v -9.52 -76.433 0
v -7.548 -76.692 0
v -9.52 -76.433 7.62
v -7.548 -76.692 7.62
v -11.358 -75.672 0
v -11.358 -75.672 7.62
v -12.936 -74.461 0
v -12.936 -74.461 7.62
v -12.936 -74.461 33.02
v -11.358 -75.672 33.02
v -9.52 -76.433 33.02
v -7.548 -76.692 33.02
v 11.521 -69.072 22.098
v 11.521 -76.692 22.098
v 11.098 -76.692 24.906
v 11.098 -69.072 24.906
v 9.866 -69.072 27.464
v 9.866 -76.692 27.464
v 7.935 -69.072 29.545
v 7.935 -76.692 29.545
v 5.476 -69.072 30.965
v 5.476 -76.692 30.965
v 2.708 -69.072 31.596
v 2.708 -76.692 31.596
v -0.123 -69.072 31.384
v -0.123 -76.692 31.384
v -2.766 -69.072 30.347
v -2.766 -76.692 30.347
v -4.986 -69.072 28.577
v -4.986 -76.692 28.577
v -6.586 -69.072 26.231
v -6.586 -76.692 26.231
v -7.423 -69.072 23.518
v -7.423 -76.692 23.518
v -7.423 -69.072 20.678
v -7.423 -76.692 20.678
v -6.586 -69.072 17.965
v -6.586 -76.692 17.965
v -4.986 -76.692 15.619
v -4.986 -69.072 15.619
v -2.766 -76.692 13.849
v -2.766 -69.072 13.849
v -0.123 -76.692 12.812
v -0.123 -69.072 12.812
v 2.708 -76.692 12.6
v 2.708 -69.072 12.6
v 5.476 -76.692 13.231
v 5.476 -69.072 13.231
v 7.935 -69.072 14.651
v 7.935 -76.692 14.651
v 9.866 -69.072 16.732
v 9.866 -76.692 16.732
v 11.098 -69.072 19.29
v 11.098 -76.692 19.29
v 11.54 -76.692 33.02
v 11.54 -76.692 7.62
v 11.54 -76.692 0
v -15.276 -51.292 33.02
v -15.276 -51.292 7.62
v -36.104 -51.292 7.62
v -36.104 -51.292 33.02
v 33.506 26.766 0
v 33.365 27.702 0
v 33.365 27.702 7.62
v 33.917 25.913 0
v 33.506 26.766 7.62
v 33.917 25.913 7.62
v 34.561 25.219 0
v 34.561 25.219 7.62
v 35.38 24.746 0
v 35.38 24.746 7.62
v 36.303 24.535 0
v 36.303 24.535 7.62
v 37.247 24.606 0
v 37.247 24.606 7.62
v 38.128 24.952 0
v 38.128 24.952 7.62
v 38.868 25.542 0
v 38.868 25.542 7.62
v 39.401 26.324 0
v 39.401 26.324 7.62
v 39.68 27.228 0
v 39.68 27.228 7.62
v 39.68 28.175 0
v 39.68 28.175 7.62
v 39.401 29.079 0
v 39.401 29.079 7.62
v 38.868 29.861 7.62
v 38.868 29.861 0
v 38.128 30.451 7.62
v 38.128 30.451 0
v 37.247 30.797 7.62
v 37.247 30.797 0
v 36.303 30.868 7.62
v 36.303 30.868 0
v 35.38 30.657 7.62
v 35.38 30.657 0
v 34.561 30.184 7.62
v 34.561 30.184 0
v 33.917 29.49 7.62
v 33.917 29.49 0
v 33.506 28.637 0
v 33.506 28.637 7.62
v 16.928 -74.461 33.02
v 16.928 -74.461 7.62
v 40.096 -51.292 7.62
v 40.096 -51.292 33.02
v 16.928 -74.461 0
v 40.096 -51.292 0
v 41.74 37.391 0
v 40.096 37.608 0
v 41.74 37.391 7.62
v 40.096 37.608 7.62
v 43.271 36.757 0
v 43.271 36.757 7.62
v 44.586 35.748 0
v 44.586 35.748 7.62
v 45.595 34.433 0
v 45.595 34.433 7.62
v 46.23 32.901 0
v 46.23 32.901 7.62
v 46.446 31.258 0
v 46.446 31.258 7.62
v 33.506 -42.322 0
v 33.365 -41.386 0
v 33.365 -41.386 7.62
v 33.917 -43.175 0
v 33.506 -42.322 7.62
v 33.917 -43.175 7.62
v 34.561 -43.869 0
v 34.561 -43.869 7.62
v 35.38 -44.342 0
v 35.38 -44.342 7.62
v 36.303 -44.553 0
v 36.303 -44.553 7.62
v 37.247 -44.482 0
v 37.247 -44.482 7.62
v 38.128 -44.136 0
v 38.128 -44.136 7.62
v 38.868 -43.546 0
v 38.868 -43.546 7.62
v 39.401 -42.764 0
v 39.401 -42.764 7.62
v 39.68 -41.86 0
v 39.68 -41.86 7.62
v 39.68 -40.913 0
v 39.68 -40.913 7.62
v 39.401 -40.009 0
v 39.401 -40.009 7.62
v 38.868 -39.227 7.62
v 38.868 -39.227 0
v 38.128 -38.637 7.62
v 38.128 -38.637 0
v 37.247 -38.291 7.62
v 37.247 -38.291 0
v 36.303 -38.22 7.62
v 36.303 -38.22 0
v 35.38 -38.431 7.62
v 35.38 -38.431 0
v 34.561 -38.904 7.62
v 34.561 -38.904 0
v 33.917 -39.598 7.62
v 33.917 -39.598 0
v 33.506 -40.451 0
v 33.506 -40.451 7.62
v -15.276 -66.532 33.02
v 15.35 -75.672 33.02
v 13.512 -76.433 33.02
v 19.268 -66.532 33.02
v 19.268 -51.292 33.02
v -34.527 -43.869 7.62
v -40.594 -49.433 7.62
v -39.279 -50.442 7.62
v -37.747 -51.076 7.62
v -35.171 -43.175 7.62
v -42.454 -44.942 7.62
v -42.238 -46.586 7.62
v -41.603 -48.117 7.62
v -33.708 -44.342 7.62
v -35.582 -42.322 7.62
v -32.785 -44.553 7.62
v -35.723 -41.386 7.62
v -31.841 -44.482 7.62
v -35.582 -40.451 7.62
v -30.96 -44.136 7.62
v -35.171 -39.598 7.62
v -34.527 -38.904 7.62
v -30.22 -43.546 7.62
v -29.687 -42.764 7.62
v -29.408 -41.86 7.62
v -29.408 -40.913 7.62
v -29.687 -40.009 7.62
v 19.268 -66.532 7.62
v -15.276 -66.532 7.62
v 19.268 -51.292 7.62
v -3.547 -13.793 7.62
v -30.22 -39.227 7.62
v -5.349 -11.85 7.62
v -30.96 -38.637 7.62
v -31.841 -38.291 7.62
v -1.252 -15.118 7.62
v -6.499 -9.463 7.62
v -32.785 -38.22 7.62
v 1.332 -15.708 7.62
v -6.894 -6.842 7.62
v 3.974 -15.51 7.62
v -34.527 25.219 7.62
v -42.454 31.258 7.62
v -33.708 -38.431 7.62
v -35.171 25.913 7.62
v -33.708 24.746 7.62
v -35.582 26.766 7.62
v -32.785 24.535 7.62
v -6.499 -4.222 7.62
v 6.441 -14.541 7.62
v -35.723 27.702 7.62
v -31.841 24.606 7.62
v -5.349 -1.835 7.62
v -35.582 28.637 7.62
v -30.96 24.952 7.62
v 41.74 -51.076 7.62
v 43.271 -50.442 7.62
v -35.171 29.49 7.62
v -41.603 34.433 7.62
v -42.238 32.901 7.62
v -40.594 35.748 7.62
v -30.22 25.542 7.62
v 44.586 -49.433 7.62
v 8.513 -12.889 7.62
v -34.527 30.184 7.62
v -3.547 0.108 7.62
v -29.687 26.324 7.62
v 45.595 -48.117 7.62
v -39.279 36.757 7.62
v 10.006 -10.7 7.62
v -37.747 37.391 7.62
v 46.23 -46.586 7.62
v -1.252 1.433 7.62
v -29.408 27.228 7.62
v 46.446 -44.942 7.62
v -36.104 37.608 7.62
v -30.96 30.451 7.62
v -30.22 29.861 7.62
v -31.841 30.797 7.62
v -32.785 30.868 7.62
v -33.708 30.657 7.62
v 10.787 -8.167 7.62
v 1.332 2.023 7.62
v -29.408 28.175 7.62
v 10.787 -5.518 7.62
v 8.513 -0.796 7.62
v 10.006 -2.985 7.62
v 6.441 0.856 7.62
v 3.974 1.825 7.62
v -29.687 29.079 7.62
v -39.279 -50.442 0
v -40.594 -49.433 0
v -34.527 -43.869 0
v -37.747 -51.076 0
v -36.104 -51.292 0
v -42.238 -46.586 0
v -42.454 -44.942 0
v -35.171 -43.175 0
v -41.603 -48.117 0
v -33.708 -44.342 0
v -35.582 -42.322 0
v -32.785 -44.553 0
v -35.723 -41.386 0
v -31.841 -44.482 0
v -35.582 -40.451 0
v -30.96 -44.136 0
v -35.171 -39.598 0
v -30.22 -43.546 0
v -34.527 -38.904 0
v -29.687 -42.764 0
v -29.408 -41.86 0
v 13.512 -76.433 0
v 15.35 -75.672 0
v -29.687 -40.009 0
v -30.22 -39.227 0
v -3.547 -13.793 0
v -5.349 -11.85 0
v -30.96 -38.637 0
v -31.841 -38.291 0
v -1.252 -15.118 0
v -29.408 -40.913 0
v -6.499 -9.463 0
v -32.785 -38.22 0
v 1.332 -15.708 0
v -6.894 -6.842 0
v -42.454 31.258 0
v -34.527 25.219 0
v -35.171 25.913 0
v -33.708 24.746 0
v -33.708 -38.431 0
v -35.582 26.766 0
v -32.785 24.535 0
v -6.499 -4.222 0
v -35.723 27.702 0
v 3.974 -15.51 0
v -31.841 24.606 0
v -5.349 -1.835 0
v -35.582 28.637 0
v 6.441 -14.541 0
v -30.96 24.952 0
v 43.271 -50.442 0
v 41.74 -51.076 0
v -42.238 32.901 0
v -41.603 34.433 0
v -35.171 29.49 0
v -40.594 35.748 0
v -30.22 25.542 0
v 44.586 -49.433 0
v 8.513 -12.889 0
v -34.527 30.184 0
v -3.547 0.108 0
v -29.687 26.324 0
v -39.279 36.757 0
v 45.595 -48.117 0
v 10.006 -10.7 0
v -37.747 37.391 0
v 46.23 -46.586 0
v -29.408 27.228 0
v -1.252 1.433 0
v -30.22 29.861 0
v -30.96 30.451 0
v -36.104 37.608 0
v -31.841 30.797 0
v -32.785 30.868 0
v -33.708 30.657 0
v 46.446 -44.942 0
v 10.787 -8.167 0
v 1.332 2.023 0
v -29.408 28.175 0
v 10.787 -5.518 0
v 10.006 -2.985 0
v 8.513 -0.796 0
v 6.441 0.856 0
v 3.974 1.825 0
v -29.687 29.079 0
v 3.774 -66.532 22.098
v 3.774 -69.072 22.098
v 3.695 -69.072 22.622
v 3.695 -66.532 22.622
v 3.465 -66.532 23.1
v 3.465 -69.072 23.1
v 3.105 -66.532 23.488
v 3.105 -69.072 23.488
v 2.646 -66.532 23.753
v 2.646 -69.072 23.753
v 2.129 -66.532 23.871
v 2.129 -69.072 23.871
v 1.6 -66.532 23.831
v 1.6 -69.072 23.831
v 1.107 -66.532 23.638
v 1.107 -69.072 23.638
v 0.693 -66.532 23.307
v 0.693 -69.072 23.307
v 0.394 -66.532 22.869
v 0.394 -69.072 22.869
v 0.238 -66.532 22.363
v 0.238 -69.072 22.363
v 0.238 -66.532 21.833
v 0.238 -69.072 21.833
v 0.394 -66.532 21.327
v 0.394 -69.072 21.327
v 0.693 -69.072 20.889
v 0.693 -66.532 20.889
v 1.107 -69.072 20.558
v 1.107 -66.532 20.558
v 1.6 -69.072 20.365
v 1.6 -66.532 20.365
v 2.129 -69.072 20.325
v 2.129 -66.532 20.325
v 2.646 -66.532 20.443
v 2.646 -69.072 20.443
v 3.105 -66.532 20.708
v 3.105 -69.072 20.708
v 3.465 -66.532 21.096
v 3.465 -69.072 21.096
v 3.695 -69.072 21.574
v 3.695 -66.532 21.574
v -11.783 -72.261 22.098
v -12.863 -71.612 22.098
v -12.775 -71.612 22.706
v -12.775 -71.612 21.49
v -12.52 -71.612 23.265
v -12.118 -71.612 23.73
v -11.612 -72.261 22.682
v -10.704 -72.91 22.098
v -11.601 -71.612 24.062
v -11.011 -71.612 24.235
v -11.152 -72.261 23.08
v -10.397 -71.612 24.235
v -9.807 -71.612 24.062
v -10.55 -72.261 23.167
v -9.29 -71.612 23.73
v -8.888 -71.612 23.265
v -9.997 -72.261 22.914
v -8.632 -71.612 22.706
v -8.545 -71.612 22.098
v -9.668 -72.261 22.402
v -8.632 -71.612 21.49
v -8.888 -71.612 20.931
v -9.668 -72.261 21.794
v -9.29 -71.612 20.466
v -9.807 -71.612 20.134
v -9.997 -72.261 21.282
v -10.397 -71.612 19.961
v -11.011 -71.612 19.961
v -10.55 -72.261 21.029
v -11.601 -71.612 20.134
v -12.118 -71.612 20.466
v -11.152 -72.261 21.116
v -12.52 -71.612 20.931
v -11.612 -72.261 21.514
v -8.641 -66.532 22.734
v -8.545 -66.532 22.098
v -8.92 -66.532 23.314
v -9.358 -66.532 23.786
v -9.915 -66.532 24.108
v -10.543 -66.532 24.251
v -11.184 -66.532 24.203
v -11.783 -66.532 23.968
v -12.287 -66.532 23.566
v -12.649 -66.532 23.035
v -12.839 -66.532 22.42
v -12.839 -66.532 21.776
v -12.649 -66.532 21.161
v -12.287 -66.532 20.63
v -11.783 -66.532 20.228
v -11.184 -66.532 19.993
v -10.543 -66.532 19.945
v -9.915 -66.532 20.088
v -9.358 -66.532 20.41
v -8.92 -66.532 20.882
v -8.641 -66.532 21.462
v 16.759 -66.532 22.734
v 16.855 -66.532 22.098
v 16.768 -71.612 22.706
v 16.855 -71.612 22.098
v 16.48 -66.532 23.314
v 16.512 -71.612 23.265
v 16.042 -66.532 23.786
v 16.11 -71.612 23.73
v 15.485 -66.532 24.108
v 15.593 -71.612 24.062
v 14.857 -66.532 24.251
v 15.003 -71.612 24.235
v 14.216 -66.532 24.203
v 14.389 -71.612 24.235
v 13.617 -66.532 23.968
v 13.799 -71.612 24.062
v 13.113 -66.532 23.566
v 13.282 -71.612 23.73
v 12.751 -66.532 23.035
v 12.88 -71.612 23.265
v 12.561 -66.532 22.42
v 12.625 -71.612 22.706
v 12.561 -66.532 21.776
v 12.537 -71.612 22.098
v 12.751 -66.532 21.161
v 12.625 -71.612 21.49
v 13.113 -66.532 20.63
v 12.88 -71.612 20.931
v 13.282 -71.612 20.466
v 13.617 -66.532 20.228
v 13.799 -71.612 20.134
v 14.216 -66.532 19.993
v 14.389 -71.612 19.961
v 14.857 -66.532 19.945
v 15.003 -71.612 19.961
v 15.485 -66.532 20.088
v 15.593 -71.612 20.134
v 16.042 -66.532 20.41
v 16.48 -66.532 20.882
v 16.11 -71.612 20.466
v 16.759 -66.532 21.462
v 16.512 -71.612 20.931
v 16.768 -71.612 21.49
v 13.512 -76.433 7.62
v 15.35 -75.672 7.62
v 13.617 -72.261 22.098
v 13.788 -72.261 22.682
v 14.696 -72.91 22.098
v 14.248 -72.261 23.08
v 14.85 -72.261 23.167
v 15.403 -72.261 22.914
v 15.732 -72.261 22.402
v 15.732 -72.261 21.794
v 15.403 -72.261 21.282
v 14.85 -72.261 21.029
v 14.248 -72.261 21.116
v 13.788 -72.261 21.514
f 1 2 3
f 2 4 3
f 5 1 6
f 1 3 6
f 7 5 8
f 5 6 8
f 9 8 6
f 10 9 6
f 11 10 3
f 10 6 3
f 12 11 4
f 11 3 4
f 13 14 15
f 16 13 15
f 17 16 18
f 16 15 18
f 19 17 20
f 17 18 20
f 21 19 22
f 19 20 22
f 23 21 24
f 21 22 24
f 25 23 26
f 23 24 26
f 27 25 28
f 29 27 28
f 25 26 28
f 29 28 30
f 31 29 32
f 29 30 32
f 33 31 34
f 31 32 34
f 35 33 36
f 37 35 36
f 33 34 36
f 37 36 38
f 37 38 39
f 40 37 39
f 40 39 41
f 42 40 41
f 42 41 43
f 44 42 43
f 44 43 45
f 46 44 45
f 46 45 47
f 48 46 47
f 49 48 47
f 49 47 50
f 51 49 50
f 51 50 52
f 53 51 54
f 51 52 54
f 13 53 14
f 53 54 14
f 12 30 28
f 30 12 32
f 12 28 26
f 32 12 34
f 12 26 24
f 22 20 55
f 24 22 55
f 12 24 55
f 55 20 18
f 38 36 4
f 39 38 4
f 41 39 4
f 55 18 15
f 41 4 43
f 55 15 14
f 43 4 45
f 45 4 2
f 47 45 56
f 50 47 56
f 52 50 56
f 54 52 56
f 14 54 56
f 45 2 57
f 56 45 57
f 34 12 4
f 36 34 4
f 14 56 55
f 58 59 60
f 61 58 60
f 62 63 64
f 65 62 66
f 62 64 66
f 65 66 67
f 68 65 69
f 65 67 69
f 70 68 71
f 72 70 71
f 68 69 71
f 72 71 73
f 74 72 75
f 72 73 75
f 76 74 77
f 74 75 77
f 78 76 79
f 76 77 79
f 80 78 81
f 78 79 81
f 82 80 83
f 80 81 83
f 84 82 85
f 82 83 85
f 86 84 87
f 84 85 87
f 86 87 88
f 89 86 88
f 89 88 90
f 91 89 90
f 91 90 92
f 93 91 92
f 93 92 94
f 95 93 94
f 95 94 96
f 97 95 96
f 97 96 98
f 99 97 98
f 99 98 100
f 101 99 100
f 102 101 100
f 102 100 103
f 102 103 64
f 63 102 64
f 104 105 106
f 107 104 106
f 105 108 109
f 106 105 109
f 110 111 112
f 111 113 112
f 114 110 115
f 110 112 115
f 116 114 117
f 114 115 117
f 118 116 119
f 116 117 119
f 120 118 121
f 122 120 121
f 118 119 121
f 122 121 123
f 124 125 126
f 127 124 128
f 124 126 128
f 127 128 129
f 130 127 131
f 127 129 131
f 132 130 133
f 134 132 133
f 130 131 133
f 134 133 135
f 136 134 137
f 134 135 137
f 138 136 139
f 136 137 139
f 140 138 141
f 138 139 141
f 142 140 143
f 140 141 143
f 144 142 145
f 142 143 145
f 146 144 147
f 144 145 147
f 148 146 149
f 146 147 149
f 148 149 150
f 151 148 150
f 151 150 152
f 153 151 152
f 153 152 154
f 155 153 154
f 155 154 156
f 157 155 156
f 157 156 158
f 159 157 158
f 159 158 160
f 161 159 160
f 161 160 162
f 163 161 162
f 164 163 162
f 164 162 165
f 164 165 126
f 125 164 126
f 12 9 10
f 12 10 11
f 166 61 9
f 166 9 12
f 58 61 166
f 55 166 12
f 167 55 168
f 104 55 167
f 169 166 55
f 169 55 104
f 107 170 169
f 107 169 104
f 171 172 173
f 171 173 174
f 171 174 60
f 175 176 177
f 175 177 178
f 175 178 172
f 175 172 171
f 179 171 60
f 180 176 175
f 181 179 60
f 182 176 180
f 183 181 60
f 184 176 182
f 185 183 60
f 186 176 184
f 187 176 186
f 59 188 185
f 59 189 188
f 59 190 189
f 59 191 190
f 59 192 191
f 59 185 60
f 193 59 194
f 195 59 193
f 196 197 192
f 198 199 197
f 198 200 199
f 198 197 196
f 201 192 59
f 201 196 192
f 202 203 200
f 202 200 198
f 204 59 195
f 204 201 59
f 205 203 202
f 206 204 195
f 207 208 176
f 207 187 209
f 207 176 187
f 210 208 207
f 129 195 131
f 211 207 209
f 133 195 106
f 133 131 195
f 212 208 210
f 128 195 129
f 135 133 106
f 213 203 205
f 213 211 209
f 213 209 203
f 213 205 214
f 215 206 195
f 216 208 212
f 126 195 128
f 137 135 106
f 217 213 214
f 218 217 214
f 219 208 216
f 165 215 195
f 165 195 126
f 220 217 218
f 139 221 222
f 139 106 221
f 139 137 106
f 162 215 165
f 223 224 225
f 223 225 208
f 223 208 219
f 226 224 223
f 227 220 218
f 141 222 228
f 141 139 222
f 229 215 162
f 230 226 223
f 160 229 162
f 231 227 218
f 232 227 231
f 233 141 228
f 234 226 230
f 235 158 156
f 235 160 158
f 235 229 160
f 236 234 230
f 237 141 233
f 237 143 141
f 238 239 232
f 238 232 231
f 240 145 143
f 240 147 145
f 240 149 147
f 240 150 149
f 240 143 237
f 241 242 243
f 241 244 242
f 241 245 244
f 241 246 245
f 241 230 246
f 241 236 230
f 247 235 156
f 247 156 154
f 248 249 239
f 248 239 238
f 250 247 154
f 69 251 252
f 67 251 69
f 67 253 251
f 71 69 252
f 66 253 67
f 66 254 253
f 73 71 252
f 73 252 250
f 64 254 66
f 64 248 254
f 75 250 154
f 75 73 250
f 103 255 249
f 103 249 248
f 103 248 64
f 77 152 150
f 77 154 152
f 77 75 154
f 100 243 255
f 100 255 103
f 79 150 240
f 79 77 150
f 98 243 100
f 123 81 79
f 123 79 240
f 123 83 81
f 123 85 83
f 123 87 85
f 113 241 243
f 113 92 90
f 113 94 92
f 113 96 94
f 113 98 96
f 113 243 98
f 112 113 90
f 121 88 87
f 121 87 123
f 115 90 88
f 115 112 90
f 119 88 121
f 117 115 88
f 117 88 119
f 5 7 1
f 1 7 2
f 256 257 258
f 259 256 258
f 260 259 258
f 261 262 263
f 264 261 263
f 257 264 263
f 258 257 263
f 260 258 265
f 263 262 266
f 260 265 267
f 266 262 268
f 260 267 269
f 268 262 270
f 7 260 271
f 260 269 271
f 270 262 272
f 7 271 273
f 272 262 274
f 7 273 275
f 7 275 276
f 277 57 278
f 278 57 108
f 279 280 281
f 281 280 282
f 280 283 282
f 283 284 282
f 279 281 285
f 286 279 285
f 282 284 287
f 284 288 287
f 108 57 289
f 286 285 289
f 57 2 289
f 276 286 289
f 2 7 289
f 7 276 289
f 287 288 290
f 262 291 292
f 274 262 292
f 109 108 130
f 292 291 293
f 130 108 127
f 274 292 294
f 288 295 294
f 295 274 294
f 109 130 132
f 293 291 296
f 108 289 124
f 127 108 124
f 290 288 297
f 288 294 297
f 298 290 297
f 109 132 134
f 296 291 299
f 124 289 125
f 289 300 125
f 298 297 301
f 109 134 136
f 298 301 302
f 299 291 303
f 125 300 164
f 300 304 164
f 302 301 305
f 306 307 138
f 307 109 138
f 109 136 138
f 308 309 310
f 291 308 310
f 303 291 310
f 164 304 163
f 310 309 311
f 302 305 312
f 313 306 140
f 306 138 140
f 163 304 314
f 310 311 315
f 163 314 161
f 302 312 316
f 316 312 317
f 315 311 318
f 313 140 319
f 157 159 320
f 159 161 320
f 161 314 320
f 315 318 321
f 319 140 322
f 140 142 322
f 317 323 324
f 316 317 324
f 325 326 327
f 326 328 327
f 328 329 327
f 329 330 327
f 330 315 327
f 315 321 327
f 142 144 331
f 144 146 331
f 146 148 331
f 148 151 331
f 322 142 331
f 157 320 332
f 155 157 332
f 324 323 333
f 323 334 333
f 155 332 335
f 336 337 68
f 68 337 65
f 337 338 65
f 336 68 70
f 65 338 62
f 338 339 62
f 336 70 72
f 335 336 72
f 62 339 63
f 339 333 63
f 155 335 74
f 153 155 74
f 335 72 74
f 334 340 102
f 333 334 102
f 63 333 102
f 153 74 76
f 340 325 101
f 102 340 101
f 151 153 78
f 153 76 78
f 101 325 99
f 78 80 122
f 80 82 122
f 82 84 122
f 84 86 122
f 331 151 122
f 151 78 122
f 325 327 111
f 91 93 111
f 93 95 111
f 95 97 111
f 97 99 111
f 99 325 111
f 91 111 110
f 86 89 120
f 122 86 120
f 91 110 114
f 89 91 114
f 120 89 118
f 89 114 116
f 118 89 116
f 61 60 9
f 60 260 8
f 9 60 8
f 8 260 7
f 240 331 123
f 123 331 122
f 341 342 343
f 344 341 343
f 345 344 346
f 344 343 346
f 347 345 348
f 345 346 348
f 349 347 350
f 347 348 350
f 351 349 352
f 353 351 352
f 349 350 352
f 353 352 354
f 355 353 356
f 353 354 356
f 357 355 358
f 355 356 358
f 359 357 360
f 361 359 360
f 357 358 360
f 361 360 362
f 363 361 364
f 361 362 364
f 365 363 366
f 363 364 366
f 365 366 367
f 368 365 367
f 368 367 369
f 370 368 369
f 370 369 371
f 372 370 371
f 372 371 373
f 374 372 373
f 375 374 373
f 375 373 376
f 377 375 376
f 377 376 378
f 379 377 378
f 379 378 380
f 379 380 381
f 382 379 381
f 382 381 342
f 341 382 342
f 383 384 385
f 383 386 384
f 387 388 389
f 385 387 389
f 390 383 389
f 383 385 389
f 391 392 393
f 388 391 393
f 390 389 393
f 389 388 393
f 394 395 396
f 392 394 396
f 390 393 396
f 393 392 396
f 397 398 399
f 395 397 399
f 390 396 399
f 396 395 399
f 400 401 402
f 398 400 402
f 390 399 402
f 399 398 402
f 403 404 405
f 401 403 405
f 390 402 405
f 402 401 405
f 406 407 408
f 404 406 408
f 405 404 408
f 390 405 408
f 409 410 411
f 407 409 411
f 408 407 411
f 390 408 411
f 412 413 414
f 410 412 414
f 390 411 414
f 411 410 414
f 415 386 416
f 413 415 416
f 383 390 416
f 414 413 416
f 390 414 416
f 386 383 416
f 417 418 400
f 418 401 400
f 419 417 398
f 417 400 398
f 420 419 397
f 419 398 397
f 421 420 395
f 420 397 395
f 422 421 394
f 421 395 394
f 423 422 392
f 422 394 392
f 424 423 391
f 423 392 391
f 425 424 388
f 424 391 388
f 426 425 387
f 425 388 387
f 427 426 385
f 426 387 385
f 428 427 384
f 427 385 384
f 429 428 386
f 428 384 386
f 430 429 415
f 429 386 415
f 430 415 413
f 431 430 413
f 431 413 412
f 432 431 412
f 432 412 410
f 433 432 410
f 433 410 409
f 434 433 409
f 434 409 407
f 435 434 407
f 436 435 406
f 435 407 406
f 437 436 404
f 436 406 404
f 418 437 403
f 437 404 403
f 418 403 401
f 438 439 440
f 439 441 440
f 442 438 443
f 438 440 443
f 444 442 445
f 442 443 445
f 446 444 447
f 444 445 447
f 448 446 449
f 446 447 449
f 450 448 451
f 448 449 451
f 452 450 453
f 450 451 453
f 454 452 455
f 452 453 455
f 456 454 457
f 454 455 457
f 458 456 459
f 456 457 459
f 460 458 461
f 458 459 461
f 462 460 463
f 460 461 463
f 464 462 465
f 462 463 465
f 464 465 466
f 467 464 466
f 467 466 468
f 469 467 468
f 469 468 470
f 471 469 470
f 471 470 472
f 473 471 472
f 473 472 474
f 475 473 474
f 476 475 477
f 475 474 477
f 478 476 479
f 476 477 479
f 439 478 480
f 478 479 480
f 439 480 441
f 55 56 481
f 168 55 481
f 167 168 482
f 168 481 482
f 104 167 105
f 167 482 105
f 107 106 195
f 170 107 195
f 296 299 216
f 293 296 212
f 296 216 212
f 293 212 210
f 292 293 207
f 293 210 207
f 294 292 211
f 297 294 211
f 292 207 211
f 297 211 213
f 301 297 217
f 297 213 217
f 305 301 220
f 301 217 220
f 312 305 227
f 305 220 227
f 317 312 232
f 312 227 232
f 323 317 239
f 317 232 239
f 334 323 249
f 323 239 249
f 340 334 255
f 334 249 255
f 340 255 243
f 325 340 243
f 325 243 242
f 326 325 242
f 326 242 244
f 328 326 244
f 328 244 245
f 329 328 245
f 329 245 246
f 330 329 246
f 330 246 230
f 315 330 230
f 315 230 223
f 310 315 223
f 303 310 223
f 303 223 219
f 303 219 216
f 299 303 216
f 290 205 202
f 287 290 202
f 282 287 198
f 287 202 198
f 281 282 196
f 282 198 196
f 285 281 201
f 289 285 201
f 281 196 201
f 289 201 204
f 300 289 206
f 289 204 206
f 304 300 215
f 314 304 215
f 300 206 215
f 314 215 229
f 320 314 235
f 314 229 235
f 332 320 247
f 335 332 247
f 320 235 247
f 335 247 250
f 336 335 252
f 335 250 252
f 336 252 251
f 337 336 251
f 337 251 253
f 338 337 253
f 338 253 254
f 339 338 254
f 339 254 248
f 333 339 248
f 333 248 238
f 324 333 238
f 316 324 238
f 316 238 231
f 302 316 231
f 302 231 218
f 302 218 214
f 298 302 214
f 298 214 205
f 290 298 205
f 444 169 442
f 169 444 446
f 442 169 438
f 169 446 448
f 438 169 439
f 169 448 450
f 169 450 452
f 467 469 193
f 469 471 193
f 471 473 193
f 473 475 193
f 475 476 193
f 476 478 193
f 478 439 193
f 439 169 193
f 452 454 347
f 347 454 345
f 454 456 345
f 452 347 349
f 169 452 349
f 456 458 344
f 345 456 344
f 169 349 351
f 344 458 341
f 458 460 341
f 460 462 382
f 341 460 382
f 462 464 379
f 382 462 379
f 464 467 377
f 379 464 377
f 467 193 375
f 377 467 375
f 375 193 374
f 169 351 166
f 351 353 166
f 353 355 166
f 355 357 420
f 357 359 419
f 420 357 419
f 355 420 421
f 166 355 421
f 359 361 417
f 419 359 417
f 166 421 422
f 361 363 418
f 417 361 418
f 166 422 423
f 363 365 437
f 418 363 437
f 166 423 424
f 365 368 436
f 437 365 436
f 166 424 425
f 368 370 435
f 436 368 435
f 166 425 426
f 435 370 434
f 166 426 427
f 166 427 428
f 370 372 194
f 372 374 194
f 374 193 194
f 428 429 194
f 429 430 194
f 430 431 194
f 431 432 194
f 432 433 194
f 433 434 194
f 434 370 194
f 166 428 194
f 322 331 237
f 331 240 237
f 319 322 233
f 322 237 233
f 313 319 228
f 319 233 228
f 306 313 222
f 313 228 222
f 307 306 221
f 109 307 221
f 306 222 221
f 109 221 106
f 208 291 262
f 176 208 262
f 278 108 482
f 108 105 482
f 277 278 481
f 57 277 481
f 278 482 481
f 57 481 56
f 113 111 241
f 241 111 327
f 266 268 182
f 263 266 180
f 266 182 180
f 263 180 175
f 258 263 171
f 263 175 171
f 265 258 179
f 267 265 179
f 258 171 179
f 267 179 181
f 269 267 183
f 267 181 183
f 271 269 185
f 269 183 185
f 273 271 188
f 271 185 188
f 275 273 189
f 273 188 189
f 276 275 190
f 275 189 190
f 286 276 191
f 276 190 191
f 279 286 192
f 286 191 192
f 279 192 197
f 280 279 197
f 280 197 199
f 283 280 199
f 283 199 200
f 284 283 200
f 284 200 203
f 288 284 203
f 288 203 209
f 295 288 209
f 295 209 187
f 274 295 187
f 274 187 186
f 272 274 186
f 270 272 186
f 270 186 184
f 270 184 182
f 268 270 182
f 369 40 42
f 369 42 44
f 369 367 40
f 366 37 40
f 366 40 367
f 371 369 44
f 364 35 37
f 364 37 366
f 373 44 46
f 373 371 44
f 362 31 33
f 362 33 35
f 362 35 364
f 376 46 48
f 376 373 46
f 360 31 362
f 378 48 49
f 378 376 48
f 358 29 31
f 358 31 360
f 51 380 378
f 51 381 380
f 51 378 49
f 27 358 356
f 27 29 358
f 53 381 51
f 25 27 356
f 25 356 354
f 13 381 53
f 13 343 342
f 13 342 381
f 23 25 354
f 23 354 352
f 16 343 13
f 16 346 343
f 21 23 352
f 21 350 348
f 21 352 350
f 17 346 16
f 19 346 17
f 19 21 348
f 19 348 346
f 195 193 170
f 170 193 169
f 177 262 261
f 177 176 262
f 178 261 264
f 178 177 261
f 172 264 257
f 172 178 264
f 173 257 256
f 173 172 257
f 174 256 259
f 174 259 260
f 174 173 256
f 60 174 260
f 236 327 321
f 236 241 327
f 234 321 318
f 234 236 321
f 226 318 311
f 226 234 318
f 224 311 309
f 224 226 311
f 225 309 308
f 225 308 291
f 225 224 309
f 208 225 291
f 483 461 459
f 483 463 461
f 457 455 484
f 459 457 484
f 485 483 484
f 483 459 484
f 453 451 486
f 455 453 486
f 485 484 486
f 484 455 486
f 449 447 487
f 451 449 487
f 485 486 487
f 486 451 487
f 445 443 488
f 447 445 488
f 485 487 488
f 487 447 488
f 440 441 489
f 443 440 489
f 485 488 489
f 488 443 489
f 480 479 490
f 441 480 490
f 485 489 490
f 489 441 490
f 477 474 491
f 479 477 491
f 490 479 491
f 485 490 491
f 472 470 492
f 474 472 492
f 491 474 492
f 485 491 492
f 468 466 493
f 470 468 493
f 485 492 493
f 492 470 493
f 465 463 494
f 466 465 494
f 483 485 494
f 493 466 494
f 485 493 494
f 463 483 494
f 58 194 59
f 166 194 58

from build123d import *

# Parameters (mm, degrees)
F0_W        = 20.32
F0_H        = 50.8
F1_DEPTH    = 7.62
F2_D        = 6.35
F3_R        = 6.35
F4_D        = 17.78
F5_DEPTH    = 25.4
F6_T1_DEPTH = 138.2614957887
F7_R        = 7.62
F9_DEPTH    = 25.4
F11_D       = 4.318
F11_DEPTH   = 5.08
F11_TIP     = 1.2972580765
F12_D       = 3.556
F13_R       = 9.525
F13_R_2     = 1.778
F14_DEPTH   = 7.62
F10_W       = 5.588
F10_H       = 25.4
F16_DEPTH   = 15.24
F17_DEPTH   = 25.4


# Not quite as in the source:
# - a fillet or chamfer that OpenCascade refuses, or shapes differently, is made with other operations: its cross-section is extruded or revolved along the edge and cut away or added


with BuildPart() as f1:
    # F0 (on Top) → F1 (new body)
    with BuildSketch(Plane.XY):
        Polygon((46.4461110532, 37.6075126914), (-42.4538889468, 37.6075126914), (-42.4538889468, -51.2924873086), (46.4461110532, -51.2924873086), (46.4461110532, -32.2424873086), (26.1261110532, -32.2424873086), (26.1261110532, 18.5575126914), (46.4461110532, 18.5575126914), align=None)
        with Locations((36.2861110532, -6.8424873086)):
            Rectangle(F0_W, F0_H)
    extrude(amount=F1_DEPTH)

    # F2 (through all)
    with Locations(Plane(origin=(0, 0, 0), x_dir=(1, 0, 0), z_dir=(0, 0, -1))):
        with Locations((-32.5478889468, -27.7015126914), (36.5401110532, -27.7015126914), (36.5401110532, 41.3864873086), (-32.5478889468, 41.3864873086)):
            Hole(F2_D / 2)

    # F3
    f3_edges = [f1.edges().sort_by_distance(p)[0] for p in [
        (-42.453889, -51.292487, 3.81),
        (46.446111, -51.292487, 3.81),
        (46.446111, 37.607513, 3.81),
        (-42.453889, 37.607513, 3.81),
    ]]
    fillet(f3_edges, radius=F3_R)

    # F4 (through all)
    with Locations(Plane(origin=(0, 0, 0), x_dir=(1, 0, 0), z_dir=(0, 0, -1))):
        with Locations((1.9961110532, 6.8424873086)):
            Hole(F4_D / 2)

    # F5 (add): a face of the model
    f5_faces = [f1.faces().sort_by_distance(p)[0] for p in [
        (1.9961110532, -51.2924873086, 3.81),
    ]]
    extrude(f5_faces, amount=F5_DEPTH)

    # F6: chamfer of 25.4 on 3 edges, made by hand

    # F6_s2 → F6_t1 (cut)
    with BuildSketch(Plane.XY.offset(-65.3207478943)):
        Polygon((40.0961110532, -51.2924873086), (14.6961110532, -76.6924873086), (40.0961110532, -76.6924873086), align=None)
        Polygon((-36.1038889468, -51.2924873086), (-10.7038889468, -76.6924873086), (-36.1038889468, -76.6924873086), align=None)
    extrude(amount=F6_T1_DEPTH, mode=Mode.SUBTRACT)

    # F7
    f7_edges = [f1.edges().sort_by_distance(p)[0] for p in [
        (14.696111, -76.692487, 3.81),
        (-10.703889, -76.692487, 3.81),
    ]]
    fillet(f7_edges, radius=F7_R)

    # F8 (on face) → F9 (join)
    with BuildSketch(Plane.XY.offset(7.62)):
        with BuildLine():
            Line((24.8561110532, -66.5324873086), (-20.8638889468, -66.5324873086))
            Line((-20.8638889468, -66.5324873086), (-12.9357352742, -74.4606409812))
            ThreePointArc((-12.9357352742, -74.4606409812), (-10.4636293562, -76.1124493463), (-7.5475816015, -76.6924873086))
            Line((-7.5475816015, -76.6924873086), (11.5398037079, -76.6924873086))
            ThreePointArc((11.5398037079, -76.6924873086), (14.4558514626, -76.1124493463), (16.9279573806, -74.4606409812))
            Line((16.9279573806, -74.4606409812), (24.8561110532, -66.5324873086))
        make_face()
    extrude(amount=F9_DEPTH)

    # F11
    with Locations(Plane(origin=(0, -66.5324873086, 0), x_dir=(-1, 0, 0), z_dir=(0, 1, 0))):
        with Locations((-14.6961110532, 22.098), (10.7038889468, 22.098)):
            Hole(F11_D / 2, depth=F11_DEPTH)
            with Locations((0, 0, -(F11_DEPTH + F11_TIP / 2))):  # 118° drill point
                Cone(0, F11_D / 2, F11_TIP, mode=Mode.SUBTRACT)

    # F12 (through all)
    with Locations(Plane(origin=(0, -66.5324873086, 0), x_dir=(-1, 0, 0), z_dir=(0, 1, 0))):
        with Locations((-1.9961110532, 22.098)):
            Hole(F12_D / 2)

    # F13 (on face) → F14 (cut)
    with BuildSketch(Plane.XZ.offset(76.6924873086)):
        with Locations((1.9961110532, 22.098)):
            Circle(F13_R)
        with Locations((1.9961110532, 22.098)):
            Circle(F13_R_2, mode=Mode.SUBTRACT)
    extrude(amount=-F14_DEPTH, mode=Mode.SUBTRACT)

    # F10 (on face) → F16 (join)
    with BuildSketch(Plane(origin=(0, -66.5324873086, 0), x_dir=(-1, 0, 0), z_dir=(0, 1, 0))):
        with Locations((-22.0621110532, 20.32)):
            Rectangle(F10_W, F10_H)
        with Locations((18.0698889468, 20.32)):
            Rectangle(F10_W, F10_H)
    extrude(amount=F16_DEPTH)

    # F15 (on face) → F17 (join)
    with BuildSketch(Plane.XY.offset(7.62)):
        Polygon((24.8561110532, -66.5324873086), (40.0961110532, -51.2924873086), (24.8561110532, -51.2924873086), align=None)
        Polygon((-36.1038889468, -51.2924873086), (-20.8638889468, -66.5324873086), (-20.8638889468, -51.2924873086), align=None)
    extrude(amount=F17_DEPTH)


solid = f1.part
